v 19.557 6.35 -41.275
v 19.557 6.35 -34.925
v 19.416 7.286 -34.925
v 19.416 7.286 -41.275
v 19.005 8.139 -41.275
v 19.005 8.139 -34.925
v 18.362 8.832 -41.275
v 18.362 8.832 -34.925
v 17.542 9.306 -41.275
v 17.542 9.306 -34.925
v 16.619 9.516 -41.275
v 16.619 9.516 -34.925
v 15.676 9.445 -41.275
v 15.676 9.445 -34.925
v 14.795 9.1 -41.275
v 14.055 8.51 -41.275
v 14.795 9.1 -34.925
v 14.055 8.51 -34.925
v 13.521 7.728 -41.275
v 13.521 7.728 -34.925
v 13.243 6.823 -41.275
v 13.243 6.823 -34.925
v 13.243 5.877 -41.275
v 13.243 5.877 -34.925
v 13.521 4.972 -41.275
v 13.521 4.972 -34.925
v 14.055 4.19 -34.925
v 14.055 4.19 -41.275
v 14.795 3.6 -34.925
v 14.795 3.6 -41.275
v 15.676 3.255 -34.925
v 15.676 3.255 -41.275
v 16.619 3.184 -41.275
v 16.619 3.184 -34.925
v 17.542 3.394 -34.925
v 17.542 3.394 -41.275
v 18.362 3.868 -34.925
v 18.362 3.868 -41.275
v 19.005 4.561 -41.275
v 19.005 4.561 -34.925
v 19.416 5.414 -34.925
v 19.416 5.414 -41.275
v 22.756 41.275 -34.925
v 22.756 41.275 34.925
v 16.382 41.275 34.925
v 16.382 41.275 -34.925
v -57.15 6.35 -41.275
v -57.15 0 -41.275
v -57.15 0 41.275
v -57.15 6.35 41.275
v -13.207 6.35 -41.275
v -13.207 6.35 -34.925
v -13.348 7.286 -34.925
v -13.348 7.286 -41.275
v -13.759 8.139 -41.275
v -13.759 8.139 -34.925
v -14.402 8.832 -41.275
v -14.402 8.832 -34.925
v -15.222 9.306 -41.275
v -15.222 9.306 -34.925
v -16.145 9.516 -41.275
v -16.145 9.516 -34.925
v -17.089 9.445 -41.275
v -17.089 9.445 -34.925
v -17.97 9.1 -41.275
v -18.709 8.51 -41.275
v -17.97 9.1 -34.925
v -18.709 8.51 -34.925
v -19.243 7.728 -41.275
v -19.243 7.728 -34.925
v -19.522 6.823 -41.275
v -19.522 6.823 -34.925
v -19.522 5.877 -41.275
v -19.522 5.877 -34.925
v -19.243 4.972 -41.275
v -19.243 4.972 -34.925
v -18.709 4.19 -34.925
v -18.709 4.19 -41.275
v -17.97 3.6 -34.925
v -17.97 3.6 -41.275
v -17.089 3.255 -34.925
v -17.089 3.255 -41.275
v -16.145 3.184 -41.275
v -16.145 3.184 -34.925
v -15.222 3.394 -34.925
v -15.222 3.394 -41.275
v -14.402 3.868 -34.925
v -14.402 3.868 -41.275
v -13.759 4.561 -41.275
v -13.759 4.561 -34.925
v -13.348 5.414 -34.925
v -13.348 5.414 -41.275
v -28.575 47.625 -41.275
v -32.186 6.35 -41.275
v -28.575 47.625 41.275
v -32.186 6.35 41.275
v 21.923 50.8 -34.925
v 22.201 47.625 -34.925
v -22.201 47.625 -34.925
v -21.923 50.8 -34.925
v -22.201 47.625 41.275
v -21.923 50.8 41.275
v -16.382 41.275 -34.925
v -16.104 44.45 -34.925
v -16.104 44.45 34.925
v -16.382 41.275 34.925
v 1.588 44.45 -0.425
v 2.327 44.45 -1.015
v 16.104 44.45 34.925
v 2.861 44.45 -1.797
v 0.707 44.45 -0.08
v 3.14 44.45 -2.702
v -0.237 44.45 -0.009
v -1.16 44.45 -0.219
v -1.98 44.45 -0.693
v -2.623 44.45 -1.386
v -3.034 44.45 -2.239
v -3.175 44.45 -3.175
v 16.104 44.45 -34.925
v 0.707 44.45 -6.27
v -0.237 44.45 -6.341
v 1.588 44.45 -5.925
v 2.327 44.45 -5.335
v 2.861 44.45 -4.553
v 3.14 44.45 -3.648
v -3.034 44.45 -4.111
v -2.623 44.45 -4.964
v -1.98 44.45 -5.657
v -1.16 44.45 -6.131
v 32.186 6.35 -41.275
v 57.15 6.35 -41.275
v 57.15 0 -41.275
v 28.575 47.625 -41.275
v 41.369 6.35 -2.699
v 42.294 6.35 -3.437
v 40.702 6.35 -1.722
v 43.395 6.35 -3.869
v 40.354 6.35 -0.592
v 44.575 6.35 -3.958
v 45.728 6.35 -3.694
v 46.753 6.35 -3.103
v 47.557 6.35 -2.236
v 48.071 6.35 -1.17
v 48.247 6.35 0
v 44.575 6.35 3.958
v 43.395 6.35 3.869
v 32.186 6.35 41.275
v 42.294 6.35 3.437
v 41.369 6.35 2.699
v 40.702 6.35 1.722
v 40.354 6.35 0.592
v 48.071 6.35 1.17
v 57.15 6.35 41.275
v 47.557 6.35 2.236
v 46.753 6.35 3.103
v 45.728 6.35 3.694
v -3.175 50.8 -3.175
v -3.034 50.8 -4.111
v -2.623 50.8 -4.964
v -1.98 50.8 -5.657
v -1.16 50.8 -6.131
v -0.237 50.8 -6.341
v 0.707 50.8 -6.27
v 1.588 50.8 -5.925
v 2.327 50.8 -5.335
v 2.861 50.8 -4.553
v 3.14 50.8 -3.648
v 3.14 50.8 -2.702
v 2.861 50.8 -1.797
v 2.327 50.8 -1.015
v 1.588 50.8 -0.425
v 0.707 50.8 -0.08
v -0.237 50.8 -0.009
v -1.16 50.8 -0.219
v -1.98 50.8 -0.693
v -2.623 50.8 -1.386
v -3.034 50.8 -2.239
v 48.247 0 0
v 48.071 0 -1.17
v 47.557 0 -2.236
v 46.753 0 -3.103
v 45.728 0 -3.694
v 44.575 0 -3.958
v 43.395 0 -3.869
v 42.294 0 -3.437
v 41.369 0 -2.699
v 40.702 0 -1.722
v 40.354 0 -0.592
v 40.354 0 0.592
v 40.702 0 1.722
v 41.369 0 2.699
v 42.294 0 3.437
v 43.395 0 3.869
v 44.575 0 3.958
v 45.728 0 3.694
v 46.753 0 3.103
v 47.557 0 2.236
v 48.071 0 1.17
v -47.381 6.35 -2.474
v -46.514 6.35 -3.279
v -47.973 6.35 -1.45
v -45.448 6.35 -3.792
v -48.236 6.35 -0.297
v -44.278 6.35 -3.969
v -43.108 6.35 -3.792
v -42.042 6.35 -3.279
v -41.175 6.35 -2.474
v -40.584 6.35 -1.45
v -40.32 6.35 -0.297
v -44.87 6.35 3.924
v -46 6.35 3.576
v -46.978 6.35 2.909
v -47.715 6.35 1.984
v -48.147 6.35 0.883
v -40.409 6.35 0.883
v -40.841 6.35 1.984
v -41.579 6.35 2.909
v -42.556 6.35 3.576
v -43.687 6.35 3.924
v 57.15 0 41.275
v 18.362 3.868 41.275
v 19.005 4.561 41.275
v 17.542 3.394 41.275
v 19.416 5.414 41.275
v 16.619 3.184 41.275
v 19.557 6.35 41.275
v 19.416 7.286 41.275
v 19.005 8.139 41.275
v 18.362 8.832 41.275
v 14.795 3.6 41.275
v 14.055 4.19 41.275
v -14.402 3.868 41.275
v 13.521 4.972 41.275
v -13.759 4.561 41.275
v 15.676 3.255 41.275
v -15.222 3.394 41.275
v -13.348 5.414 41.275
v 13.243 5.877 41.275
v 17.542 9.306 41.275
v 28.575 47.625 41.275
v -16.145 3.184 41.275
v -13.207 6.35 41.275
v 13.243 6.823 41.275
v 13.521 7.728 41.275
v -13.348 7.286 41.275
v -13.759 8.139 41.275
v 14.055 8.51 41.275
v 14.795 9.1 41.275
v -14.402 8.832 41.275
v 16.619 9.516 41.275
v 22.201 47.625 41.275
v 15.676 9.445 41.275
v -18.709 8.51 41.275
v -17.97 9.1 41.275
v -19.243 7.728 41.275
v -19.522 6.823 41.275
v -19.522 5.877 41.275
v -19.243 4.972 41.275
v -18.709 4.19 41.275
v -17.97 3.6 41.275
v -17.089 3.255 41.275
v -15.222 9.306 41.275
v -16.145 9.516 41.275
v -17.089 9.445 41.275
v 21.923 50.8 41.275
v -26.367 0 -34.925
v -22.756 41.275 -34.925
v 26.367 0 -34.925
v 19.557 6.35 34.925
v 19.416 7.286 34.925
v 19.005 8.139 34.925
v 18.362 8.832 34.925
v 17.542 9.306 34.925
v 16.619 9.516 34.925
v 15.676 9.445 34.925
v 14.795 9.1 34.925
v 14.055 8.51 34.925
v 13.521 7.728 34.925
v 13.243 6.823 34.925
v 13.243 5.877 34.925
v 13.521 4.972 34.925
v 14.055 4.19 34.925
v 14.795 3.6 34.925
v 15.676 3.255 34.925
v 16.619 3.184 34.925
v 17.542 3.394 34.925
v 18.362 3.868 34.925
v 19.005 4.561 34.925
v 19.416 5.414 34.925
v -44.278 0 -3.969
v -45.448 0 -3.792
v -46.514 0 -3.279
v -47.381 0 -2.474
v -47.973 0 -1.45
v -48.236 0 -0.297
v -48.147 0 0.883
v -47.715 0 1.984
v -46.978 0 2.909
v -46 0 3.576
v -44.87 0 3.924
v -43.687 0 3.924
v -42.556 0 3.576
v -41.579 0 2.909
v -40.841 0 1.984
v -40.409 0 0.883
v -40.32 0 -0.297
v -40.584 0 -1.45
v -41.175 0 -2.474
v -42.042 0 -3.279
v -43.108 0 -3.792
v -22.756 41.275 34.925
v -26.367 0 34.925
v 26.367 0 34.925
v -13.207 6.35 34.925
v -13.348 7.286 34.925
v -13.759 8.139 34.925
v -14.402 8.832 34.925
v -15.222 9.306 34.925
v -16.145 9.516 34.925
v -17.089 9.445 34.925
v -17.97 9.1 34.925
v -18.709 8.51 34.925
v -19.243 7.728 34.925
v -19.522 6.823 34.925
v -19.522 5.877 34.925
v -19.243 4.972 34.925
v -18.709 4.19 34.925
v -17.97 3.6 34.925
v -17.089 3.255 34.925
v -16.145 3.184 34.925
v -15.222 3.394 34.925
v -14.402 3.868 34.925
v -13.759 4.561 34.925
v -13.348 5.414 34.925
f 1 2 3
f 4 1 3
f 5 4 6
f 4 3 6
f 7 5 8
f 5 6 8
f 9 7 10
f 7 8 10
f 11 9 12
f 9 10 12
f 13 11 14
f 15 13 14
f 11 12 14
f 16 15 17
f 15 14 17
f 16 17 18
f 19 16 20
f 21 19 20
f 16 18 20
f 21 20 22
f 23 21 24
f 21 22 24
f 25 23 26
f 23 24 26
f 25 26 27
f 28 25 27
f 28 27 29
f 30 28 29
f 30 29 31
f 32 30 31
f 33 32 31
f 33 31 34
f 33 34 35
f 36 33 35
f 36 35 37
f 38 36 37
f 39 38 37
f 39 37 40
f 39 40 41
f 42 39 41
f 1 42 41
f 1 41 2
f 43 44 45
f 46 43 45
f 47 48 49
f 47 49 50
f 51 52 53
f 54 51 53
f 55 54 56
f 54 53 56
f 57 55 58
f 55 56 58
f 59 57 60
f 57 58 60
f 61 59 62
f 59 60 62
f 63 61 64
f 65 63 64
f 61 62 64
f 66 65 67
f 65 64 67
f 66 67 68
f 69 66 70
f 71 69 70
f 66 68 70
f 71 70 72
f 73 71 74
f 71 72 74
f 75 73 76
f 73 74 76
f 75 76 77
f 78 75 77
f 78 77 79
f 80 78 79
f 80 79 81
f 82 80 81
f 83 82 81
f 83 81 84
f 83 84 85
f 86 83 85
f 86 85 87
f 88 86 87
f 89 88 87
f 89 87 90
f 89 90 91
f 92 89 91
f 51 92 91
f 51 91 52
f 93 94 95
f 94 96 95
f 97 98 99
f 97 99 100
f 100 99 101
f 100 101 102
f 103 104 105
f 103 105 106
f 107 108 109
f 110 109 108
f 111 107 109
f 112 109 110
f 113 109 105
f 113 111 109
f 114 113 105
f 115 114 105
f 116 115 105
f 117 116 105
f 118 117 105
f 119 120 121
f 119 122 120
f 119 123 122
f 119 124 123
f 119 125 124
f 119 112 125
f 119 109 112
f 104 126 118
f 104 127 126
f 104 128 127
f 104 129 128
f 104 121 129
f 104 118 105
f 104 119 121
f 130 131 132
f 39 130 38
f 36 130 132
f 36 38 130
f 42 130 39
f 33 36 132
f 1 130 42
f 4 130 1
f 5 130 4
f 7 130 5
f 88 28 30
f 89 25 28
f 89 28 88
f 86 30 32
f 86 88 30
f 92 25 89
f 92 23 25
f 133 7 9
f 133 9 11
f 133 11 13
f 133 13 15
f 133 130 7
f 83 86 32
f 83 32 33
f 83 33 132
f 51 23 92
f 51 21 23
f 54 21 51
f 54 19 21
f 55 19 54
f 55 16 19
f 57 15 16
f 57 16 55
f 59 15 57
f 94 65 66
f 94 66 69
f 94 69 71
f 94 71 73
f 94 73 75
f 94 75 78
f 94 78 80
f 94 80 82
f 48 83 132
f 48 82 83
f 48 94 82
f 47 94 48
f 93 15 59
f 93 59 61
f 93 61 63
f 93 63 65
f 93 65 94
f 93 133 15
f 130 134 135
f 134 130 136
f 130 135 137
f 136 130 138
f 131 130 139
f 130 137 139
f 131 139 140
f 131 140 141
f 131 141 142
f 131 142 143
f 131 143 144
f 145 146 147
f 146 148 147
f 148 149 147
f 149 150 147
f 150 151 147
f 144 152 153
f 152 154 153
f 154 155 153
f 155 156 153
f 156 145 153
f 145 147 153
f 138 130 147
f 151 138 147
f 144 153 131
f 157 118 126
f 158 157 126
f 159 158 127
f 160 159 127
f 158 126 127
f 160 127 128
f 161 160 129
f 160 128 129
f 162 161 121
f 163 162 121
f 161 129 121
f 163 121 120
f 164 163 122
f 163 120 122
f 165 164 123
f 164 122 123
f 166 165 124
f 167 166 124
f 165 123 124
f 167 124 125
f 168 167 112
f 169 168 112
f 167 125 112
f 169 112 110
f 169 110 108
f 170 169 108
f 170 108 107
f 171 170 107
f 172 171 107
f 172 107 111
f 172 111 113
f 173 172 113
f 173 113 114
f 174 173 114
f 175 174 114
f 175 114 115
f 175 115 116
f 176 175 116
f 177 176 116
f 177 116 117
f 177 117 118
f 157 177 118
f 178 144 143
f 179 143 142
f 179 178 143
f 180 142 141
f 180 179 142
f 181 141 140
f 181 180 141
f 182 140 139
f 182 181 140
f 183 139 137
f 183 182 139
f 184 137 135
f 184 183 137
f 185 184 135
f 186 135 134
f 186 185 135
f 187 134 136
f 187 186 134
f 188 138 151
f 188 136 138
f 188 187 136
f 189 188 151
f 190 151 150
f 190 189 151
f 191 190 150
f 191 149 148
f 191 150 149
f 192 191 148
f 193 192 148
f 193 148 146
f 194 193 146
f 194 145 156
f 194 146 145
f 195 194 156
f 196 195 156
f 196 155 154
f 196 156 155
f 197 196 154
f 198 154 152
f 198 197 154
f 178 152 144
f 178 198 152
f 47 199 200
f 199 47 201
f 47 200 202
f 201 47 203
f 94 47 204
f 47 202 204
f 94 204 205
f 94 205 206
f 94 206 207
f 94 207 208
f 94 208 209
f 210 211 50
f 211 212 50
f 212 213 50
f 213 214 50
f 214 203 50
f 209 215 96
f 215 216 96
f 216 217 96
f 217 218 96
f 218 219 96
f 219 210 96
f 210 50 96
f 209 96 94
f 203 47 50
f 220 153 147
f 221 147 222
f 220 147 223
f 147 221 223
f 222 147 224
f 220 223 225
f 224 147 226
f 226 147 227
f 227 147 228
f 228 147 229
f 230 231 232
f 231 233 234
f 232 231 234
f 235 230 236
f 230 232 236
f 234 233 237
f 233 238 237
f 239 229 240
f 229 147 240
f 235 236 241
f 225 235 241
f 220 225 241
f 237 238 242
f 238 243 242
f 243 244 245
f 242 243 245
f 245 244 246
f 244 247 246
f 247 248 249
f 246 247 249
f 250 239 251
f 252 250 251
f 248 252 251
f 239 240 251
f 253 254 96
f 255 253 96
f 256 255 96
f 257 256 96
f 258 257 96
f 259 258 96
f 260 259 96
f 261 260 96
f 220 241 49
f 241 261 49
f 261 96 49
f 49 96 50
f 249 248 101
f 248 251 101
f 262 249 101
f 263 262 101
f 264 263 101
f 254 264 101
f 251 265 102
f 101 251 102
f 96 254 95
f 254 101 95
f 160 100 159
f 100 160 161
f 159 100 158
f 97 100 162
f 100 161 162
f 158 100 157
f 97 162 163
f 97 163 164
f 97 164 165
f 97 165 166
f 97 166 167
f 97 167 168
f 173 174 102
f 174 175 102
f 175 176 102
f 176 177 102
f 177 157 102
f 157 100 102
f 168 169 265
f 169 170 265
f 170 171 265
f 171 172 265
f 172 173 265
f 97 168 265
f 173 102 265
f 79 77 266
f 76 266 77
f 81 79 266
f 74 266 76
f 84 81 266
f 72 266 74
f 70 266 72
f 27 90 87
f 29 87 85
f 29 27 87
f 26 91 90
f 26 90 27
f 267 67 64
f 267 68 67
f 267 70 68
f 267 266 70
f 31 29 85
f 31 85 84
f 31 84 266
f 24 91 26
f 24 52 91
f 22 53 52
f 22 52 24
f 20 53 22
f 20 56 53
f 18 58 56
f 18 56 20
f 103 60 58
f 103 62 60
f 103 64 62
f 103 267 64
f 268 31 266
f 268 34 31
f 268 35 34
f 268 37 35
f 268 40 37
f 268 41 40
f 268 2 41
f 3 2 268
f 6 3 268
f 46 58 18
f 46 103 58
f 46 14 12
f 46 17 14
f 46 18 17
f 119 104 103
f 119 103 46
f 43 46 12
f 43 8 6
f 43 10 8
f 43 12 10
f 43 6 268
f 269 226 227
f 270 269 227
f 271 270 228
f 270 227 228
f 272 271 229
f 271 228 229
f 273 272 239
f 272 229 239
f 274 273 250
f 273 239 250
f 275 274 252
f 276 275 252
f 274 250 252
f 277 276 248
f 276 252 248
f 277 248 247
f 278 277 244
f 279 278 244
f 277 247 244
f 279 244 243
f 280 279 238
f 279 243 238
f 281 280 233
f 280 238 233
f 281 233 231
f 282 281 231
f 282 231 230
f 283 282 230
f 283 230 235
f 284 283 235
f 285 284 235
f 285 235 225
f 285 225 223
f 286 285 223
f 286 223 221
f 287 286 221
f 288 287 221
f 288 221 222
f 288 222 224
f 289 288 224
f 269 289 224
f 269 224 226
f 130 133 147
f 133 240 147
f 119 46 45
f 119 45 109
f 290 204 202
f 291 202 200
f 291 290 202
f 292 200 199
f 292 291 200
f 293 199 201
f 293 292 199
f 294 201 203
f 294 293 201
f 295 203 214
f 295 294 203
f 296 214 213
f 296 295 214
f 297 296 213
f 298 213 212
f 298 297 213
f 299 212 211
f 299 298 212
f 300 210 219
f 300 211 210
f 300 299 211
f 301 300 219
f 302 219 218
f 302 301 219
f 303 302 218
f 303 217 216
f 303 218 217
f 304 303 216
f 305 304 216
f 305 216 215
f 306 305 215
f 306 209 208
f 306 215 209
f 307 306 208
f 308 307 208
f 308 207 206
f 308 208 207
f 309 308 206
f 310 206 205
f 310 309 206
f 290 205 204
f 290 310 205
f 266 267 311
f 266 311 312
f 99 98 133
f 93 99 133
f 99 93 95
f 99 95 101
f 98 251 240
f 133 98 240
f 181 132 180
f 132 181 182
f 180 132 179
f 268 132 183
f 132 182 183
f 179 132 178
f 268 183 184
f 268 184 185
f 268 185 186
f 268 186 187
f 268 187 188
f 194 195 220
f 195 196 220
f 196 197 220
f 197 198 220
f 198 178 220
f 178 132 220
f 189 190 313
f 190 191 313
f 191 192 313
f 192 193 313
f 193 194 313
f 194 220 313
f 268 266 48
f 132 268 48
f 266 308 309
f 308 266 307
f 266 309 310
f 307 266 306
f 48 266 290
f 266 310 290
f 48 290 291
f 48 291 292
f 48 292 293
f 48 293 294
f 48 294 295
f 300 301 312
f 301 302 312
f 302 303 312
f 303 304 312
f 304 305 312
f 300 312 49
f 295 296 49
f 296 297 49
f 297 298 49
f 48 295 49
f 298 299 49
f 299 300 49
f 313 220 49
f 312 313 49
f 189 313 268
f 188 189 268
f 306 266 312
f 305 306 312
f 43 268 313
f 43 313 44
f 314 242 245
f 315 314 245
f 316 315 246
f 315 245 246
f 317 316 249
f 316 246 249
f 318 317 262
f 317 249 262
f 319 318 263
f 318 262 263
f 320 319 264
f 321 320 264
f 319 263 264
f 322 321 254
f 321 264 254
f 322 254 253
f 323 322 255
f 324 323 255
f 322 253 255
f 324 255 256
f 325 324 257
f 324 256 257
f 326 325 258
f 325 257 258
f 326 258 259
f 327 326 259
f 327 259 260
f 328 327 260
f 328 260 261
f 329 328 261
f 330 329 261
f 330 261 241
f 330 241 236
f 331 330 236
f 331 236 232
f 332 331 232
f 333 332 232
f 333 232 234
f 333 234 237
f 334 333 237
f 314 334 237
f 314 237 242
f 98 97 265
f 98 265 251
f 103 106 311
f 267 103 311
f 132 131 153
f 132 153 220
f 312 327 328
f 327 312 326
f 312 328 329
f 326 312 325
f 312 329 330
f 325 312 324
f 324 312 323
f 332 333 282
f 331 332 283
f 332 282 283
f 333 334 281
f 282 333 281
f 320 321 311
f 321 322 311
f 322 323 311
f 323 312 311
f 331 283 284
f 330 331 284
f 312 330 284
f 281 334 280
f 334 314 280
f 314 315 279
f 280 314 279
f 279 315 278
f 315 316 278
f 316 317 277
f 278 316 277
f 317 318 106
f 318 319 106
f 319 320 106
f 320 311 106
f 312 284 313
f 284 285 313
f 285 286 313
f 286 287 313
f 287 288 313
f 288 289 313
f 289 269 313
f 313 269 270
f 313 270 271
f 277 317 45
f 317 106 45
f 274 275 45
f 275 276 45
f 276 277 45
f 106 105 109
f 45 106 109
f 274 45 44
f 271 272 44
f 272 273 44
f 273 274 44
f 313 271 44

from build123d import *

# Parameters (mm, degrees)
BOSS_EXTRUDE1_DEPTH         = 41.275
SHELL1_START                = -34.925
SHELL1_DEPTH                = 69.85
CUT_EXTRUDE2_DEPTH          = 87.892969365
CUT_EXTRUDE2_DEPTH_BACK     = 87.892969365
SKETCH7_W                   = 6.35
SKETCH7_H                   = 3.175
SKETCH8_R                   = 3.96875
CUT_EXTRUDE3_DEPTH          = 120.685287839
F_1_4_0_25_DIAMETER_HOLE1_D = 6.35
F_1_4_0_25_DIAMETER_HOLE2_D = 6.35


# Read off the part's stored shape, not the designer's step: Shell1
with BuildPart() as part:
    # Sketch1 → Boss-Extrude1 (new, symmetric)
    with BuildSketch(Plane.XY):
        Polygon((57.15, 0), (-57.15, 0), (-57.15, 6.35), (-32.186094587, 6.35), (-28.575, 47.625), (-22.200744032, 47.625), (-21.922967525, 50.8), (21.922967525, 50.8), (22.200744032, 47.625), (28.575, 47.625), (32.186094587, 6.35), (57.15, 6.35), align=None)
    extrude(amount=BOSS_EXTRUDE1_DEPTH, both=True)

    # Shell1 outline → Shell1 (cut)
    with BuildSketch(Plane.XY.offset(SHELL1_START)):
        Polygon((26.367391632, 0), (22.756297045, 41.275), (16.382041077, 41.275), (16.10426457, 44.45), (-16.10426457, 44.45), (-16.382041077, 41.275), (-22.756297045, 41.275), (-26.367391632, 0), align=None)
    extrude(amount=SHELL1_DEPTH, mode=Mode.SUBTRACT)

    # Sketch7 → Cut-Extrude2 (cut, two sides: drawn at the far end of the back side and taken through both)
    with BuildSketch(Plane(origin=(0, 0, 0), x_dir=(0, 0, -1), z_dir=(1, 0, 0)).offset(-CUT_EXTRUDE2_DEPTH_BACK)):
        with Locations((38.1, 49.2125)):
            Rectangle(SKETCH7_W, SKETCH7_H)
    extrude(amount=CUT_EXTRUDE2_DEPTH + CUT_EXTRUDE2_DEPTH_BACK, mode=Mode.SUBTRACT)

    # Sketch8 → Cut-Extrude3 (cut, through all)
    with BuildSketch(Plane(origin=(0, 0, -50.8), x_dir=(1, 0, 0), z_dir=(0, 1, 0))):
        with Locations((44.278106598, -50.8)):
            Circle(SKETCH8_R)
        with Locations(Location((-44.278106598, -50.8, 0), (0, 0, 90))):
            Circle(SKETCH8_R)
    extrude(amount=CUT_EXTRUDE3_DEPTH, mode=Mode.SUBTRACT)

    # 1/4 (0.25) Diameter Hole1 (through all)
    with Locations(Plane(origin=(0, 50.8, 0), x_dir=(1, 0, 0), z_dir=(0, 1, 0))):
        with Locations((0, 3.175)):
            Hole(F_1_4_0_25_DIAMETER_HOLE1_D / 2)

    # 1/4 (0.25) Diameter Hole2 (through all)
    with Locations(Plane(origin=(0, 0, -41.275), x_dir=(-1, 0, 0), z_dir=(0, 0, -1))):
        with Locations((-16.382041077, 6.35), (16.382041077, 6.35)):
            Hole(F_1_4_0_25_DIAMETER_HOLE2_D / 2)


solid = part.part
